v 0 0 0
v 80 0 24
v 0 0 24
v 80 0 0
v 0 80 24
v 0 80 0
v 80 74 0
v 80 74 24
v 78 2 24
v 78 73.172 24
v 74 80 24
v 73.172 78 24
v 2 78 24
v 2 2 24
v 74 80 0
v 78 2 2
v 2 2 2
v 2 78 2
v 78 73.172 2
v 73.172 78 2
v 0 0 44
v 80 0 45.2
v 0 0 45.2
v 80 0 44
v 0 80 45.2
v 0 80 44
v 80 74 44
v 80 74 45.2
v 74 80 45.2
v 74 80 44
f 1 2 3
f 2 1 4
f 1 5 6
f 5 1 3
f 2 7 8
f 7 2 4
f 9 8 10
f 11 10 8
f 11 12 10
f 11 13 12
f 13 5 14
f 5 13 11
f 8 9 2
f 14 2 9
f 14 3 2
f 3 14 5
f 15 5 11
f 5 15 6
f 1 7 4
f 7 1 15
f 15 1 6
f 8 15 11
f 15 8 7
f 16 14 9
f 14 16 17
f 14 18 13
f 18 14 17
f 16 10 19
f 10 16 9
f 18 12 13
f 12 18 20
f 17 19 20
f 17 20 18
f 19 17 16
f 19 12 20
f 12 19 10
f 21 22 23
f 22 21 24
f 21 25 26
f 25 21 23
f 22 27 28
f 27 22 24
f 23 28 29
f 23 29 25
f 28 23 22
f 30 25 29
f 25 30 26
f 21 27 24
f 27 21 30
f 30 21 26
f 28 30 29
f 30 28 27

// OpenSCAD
// CONCEPT / M0. Dimensions in mm. No fasteners, connector or safety approval.
outer = [[0,0],[80,0],[80,74],[74,80],[0,80]];
inner = [[2,2],[78,2],[78,73.172],[73.172,78],[2,78]];
module chassis() { difference() {
  linear_extrude(24) polygon(outer);
  translate([0,0,2]) linear_extrude(23) polygon(inner);
} }
module cover() { translate([0,0,24]) linear_extrude(1.2) polygon(outer); }
color([0.22,0.25,0.28]) chassis();
color([0.65,0.7,0.75,0.65]) translate([0,0,20]) cover();
